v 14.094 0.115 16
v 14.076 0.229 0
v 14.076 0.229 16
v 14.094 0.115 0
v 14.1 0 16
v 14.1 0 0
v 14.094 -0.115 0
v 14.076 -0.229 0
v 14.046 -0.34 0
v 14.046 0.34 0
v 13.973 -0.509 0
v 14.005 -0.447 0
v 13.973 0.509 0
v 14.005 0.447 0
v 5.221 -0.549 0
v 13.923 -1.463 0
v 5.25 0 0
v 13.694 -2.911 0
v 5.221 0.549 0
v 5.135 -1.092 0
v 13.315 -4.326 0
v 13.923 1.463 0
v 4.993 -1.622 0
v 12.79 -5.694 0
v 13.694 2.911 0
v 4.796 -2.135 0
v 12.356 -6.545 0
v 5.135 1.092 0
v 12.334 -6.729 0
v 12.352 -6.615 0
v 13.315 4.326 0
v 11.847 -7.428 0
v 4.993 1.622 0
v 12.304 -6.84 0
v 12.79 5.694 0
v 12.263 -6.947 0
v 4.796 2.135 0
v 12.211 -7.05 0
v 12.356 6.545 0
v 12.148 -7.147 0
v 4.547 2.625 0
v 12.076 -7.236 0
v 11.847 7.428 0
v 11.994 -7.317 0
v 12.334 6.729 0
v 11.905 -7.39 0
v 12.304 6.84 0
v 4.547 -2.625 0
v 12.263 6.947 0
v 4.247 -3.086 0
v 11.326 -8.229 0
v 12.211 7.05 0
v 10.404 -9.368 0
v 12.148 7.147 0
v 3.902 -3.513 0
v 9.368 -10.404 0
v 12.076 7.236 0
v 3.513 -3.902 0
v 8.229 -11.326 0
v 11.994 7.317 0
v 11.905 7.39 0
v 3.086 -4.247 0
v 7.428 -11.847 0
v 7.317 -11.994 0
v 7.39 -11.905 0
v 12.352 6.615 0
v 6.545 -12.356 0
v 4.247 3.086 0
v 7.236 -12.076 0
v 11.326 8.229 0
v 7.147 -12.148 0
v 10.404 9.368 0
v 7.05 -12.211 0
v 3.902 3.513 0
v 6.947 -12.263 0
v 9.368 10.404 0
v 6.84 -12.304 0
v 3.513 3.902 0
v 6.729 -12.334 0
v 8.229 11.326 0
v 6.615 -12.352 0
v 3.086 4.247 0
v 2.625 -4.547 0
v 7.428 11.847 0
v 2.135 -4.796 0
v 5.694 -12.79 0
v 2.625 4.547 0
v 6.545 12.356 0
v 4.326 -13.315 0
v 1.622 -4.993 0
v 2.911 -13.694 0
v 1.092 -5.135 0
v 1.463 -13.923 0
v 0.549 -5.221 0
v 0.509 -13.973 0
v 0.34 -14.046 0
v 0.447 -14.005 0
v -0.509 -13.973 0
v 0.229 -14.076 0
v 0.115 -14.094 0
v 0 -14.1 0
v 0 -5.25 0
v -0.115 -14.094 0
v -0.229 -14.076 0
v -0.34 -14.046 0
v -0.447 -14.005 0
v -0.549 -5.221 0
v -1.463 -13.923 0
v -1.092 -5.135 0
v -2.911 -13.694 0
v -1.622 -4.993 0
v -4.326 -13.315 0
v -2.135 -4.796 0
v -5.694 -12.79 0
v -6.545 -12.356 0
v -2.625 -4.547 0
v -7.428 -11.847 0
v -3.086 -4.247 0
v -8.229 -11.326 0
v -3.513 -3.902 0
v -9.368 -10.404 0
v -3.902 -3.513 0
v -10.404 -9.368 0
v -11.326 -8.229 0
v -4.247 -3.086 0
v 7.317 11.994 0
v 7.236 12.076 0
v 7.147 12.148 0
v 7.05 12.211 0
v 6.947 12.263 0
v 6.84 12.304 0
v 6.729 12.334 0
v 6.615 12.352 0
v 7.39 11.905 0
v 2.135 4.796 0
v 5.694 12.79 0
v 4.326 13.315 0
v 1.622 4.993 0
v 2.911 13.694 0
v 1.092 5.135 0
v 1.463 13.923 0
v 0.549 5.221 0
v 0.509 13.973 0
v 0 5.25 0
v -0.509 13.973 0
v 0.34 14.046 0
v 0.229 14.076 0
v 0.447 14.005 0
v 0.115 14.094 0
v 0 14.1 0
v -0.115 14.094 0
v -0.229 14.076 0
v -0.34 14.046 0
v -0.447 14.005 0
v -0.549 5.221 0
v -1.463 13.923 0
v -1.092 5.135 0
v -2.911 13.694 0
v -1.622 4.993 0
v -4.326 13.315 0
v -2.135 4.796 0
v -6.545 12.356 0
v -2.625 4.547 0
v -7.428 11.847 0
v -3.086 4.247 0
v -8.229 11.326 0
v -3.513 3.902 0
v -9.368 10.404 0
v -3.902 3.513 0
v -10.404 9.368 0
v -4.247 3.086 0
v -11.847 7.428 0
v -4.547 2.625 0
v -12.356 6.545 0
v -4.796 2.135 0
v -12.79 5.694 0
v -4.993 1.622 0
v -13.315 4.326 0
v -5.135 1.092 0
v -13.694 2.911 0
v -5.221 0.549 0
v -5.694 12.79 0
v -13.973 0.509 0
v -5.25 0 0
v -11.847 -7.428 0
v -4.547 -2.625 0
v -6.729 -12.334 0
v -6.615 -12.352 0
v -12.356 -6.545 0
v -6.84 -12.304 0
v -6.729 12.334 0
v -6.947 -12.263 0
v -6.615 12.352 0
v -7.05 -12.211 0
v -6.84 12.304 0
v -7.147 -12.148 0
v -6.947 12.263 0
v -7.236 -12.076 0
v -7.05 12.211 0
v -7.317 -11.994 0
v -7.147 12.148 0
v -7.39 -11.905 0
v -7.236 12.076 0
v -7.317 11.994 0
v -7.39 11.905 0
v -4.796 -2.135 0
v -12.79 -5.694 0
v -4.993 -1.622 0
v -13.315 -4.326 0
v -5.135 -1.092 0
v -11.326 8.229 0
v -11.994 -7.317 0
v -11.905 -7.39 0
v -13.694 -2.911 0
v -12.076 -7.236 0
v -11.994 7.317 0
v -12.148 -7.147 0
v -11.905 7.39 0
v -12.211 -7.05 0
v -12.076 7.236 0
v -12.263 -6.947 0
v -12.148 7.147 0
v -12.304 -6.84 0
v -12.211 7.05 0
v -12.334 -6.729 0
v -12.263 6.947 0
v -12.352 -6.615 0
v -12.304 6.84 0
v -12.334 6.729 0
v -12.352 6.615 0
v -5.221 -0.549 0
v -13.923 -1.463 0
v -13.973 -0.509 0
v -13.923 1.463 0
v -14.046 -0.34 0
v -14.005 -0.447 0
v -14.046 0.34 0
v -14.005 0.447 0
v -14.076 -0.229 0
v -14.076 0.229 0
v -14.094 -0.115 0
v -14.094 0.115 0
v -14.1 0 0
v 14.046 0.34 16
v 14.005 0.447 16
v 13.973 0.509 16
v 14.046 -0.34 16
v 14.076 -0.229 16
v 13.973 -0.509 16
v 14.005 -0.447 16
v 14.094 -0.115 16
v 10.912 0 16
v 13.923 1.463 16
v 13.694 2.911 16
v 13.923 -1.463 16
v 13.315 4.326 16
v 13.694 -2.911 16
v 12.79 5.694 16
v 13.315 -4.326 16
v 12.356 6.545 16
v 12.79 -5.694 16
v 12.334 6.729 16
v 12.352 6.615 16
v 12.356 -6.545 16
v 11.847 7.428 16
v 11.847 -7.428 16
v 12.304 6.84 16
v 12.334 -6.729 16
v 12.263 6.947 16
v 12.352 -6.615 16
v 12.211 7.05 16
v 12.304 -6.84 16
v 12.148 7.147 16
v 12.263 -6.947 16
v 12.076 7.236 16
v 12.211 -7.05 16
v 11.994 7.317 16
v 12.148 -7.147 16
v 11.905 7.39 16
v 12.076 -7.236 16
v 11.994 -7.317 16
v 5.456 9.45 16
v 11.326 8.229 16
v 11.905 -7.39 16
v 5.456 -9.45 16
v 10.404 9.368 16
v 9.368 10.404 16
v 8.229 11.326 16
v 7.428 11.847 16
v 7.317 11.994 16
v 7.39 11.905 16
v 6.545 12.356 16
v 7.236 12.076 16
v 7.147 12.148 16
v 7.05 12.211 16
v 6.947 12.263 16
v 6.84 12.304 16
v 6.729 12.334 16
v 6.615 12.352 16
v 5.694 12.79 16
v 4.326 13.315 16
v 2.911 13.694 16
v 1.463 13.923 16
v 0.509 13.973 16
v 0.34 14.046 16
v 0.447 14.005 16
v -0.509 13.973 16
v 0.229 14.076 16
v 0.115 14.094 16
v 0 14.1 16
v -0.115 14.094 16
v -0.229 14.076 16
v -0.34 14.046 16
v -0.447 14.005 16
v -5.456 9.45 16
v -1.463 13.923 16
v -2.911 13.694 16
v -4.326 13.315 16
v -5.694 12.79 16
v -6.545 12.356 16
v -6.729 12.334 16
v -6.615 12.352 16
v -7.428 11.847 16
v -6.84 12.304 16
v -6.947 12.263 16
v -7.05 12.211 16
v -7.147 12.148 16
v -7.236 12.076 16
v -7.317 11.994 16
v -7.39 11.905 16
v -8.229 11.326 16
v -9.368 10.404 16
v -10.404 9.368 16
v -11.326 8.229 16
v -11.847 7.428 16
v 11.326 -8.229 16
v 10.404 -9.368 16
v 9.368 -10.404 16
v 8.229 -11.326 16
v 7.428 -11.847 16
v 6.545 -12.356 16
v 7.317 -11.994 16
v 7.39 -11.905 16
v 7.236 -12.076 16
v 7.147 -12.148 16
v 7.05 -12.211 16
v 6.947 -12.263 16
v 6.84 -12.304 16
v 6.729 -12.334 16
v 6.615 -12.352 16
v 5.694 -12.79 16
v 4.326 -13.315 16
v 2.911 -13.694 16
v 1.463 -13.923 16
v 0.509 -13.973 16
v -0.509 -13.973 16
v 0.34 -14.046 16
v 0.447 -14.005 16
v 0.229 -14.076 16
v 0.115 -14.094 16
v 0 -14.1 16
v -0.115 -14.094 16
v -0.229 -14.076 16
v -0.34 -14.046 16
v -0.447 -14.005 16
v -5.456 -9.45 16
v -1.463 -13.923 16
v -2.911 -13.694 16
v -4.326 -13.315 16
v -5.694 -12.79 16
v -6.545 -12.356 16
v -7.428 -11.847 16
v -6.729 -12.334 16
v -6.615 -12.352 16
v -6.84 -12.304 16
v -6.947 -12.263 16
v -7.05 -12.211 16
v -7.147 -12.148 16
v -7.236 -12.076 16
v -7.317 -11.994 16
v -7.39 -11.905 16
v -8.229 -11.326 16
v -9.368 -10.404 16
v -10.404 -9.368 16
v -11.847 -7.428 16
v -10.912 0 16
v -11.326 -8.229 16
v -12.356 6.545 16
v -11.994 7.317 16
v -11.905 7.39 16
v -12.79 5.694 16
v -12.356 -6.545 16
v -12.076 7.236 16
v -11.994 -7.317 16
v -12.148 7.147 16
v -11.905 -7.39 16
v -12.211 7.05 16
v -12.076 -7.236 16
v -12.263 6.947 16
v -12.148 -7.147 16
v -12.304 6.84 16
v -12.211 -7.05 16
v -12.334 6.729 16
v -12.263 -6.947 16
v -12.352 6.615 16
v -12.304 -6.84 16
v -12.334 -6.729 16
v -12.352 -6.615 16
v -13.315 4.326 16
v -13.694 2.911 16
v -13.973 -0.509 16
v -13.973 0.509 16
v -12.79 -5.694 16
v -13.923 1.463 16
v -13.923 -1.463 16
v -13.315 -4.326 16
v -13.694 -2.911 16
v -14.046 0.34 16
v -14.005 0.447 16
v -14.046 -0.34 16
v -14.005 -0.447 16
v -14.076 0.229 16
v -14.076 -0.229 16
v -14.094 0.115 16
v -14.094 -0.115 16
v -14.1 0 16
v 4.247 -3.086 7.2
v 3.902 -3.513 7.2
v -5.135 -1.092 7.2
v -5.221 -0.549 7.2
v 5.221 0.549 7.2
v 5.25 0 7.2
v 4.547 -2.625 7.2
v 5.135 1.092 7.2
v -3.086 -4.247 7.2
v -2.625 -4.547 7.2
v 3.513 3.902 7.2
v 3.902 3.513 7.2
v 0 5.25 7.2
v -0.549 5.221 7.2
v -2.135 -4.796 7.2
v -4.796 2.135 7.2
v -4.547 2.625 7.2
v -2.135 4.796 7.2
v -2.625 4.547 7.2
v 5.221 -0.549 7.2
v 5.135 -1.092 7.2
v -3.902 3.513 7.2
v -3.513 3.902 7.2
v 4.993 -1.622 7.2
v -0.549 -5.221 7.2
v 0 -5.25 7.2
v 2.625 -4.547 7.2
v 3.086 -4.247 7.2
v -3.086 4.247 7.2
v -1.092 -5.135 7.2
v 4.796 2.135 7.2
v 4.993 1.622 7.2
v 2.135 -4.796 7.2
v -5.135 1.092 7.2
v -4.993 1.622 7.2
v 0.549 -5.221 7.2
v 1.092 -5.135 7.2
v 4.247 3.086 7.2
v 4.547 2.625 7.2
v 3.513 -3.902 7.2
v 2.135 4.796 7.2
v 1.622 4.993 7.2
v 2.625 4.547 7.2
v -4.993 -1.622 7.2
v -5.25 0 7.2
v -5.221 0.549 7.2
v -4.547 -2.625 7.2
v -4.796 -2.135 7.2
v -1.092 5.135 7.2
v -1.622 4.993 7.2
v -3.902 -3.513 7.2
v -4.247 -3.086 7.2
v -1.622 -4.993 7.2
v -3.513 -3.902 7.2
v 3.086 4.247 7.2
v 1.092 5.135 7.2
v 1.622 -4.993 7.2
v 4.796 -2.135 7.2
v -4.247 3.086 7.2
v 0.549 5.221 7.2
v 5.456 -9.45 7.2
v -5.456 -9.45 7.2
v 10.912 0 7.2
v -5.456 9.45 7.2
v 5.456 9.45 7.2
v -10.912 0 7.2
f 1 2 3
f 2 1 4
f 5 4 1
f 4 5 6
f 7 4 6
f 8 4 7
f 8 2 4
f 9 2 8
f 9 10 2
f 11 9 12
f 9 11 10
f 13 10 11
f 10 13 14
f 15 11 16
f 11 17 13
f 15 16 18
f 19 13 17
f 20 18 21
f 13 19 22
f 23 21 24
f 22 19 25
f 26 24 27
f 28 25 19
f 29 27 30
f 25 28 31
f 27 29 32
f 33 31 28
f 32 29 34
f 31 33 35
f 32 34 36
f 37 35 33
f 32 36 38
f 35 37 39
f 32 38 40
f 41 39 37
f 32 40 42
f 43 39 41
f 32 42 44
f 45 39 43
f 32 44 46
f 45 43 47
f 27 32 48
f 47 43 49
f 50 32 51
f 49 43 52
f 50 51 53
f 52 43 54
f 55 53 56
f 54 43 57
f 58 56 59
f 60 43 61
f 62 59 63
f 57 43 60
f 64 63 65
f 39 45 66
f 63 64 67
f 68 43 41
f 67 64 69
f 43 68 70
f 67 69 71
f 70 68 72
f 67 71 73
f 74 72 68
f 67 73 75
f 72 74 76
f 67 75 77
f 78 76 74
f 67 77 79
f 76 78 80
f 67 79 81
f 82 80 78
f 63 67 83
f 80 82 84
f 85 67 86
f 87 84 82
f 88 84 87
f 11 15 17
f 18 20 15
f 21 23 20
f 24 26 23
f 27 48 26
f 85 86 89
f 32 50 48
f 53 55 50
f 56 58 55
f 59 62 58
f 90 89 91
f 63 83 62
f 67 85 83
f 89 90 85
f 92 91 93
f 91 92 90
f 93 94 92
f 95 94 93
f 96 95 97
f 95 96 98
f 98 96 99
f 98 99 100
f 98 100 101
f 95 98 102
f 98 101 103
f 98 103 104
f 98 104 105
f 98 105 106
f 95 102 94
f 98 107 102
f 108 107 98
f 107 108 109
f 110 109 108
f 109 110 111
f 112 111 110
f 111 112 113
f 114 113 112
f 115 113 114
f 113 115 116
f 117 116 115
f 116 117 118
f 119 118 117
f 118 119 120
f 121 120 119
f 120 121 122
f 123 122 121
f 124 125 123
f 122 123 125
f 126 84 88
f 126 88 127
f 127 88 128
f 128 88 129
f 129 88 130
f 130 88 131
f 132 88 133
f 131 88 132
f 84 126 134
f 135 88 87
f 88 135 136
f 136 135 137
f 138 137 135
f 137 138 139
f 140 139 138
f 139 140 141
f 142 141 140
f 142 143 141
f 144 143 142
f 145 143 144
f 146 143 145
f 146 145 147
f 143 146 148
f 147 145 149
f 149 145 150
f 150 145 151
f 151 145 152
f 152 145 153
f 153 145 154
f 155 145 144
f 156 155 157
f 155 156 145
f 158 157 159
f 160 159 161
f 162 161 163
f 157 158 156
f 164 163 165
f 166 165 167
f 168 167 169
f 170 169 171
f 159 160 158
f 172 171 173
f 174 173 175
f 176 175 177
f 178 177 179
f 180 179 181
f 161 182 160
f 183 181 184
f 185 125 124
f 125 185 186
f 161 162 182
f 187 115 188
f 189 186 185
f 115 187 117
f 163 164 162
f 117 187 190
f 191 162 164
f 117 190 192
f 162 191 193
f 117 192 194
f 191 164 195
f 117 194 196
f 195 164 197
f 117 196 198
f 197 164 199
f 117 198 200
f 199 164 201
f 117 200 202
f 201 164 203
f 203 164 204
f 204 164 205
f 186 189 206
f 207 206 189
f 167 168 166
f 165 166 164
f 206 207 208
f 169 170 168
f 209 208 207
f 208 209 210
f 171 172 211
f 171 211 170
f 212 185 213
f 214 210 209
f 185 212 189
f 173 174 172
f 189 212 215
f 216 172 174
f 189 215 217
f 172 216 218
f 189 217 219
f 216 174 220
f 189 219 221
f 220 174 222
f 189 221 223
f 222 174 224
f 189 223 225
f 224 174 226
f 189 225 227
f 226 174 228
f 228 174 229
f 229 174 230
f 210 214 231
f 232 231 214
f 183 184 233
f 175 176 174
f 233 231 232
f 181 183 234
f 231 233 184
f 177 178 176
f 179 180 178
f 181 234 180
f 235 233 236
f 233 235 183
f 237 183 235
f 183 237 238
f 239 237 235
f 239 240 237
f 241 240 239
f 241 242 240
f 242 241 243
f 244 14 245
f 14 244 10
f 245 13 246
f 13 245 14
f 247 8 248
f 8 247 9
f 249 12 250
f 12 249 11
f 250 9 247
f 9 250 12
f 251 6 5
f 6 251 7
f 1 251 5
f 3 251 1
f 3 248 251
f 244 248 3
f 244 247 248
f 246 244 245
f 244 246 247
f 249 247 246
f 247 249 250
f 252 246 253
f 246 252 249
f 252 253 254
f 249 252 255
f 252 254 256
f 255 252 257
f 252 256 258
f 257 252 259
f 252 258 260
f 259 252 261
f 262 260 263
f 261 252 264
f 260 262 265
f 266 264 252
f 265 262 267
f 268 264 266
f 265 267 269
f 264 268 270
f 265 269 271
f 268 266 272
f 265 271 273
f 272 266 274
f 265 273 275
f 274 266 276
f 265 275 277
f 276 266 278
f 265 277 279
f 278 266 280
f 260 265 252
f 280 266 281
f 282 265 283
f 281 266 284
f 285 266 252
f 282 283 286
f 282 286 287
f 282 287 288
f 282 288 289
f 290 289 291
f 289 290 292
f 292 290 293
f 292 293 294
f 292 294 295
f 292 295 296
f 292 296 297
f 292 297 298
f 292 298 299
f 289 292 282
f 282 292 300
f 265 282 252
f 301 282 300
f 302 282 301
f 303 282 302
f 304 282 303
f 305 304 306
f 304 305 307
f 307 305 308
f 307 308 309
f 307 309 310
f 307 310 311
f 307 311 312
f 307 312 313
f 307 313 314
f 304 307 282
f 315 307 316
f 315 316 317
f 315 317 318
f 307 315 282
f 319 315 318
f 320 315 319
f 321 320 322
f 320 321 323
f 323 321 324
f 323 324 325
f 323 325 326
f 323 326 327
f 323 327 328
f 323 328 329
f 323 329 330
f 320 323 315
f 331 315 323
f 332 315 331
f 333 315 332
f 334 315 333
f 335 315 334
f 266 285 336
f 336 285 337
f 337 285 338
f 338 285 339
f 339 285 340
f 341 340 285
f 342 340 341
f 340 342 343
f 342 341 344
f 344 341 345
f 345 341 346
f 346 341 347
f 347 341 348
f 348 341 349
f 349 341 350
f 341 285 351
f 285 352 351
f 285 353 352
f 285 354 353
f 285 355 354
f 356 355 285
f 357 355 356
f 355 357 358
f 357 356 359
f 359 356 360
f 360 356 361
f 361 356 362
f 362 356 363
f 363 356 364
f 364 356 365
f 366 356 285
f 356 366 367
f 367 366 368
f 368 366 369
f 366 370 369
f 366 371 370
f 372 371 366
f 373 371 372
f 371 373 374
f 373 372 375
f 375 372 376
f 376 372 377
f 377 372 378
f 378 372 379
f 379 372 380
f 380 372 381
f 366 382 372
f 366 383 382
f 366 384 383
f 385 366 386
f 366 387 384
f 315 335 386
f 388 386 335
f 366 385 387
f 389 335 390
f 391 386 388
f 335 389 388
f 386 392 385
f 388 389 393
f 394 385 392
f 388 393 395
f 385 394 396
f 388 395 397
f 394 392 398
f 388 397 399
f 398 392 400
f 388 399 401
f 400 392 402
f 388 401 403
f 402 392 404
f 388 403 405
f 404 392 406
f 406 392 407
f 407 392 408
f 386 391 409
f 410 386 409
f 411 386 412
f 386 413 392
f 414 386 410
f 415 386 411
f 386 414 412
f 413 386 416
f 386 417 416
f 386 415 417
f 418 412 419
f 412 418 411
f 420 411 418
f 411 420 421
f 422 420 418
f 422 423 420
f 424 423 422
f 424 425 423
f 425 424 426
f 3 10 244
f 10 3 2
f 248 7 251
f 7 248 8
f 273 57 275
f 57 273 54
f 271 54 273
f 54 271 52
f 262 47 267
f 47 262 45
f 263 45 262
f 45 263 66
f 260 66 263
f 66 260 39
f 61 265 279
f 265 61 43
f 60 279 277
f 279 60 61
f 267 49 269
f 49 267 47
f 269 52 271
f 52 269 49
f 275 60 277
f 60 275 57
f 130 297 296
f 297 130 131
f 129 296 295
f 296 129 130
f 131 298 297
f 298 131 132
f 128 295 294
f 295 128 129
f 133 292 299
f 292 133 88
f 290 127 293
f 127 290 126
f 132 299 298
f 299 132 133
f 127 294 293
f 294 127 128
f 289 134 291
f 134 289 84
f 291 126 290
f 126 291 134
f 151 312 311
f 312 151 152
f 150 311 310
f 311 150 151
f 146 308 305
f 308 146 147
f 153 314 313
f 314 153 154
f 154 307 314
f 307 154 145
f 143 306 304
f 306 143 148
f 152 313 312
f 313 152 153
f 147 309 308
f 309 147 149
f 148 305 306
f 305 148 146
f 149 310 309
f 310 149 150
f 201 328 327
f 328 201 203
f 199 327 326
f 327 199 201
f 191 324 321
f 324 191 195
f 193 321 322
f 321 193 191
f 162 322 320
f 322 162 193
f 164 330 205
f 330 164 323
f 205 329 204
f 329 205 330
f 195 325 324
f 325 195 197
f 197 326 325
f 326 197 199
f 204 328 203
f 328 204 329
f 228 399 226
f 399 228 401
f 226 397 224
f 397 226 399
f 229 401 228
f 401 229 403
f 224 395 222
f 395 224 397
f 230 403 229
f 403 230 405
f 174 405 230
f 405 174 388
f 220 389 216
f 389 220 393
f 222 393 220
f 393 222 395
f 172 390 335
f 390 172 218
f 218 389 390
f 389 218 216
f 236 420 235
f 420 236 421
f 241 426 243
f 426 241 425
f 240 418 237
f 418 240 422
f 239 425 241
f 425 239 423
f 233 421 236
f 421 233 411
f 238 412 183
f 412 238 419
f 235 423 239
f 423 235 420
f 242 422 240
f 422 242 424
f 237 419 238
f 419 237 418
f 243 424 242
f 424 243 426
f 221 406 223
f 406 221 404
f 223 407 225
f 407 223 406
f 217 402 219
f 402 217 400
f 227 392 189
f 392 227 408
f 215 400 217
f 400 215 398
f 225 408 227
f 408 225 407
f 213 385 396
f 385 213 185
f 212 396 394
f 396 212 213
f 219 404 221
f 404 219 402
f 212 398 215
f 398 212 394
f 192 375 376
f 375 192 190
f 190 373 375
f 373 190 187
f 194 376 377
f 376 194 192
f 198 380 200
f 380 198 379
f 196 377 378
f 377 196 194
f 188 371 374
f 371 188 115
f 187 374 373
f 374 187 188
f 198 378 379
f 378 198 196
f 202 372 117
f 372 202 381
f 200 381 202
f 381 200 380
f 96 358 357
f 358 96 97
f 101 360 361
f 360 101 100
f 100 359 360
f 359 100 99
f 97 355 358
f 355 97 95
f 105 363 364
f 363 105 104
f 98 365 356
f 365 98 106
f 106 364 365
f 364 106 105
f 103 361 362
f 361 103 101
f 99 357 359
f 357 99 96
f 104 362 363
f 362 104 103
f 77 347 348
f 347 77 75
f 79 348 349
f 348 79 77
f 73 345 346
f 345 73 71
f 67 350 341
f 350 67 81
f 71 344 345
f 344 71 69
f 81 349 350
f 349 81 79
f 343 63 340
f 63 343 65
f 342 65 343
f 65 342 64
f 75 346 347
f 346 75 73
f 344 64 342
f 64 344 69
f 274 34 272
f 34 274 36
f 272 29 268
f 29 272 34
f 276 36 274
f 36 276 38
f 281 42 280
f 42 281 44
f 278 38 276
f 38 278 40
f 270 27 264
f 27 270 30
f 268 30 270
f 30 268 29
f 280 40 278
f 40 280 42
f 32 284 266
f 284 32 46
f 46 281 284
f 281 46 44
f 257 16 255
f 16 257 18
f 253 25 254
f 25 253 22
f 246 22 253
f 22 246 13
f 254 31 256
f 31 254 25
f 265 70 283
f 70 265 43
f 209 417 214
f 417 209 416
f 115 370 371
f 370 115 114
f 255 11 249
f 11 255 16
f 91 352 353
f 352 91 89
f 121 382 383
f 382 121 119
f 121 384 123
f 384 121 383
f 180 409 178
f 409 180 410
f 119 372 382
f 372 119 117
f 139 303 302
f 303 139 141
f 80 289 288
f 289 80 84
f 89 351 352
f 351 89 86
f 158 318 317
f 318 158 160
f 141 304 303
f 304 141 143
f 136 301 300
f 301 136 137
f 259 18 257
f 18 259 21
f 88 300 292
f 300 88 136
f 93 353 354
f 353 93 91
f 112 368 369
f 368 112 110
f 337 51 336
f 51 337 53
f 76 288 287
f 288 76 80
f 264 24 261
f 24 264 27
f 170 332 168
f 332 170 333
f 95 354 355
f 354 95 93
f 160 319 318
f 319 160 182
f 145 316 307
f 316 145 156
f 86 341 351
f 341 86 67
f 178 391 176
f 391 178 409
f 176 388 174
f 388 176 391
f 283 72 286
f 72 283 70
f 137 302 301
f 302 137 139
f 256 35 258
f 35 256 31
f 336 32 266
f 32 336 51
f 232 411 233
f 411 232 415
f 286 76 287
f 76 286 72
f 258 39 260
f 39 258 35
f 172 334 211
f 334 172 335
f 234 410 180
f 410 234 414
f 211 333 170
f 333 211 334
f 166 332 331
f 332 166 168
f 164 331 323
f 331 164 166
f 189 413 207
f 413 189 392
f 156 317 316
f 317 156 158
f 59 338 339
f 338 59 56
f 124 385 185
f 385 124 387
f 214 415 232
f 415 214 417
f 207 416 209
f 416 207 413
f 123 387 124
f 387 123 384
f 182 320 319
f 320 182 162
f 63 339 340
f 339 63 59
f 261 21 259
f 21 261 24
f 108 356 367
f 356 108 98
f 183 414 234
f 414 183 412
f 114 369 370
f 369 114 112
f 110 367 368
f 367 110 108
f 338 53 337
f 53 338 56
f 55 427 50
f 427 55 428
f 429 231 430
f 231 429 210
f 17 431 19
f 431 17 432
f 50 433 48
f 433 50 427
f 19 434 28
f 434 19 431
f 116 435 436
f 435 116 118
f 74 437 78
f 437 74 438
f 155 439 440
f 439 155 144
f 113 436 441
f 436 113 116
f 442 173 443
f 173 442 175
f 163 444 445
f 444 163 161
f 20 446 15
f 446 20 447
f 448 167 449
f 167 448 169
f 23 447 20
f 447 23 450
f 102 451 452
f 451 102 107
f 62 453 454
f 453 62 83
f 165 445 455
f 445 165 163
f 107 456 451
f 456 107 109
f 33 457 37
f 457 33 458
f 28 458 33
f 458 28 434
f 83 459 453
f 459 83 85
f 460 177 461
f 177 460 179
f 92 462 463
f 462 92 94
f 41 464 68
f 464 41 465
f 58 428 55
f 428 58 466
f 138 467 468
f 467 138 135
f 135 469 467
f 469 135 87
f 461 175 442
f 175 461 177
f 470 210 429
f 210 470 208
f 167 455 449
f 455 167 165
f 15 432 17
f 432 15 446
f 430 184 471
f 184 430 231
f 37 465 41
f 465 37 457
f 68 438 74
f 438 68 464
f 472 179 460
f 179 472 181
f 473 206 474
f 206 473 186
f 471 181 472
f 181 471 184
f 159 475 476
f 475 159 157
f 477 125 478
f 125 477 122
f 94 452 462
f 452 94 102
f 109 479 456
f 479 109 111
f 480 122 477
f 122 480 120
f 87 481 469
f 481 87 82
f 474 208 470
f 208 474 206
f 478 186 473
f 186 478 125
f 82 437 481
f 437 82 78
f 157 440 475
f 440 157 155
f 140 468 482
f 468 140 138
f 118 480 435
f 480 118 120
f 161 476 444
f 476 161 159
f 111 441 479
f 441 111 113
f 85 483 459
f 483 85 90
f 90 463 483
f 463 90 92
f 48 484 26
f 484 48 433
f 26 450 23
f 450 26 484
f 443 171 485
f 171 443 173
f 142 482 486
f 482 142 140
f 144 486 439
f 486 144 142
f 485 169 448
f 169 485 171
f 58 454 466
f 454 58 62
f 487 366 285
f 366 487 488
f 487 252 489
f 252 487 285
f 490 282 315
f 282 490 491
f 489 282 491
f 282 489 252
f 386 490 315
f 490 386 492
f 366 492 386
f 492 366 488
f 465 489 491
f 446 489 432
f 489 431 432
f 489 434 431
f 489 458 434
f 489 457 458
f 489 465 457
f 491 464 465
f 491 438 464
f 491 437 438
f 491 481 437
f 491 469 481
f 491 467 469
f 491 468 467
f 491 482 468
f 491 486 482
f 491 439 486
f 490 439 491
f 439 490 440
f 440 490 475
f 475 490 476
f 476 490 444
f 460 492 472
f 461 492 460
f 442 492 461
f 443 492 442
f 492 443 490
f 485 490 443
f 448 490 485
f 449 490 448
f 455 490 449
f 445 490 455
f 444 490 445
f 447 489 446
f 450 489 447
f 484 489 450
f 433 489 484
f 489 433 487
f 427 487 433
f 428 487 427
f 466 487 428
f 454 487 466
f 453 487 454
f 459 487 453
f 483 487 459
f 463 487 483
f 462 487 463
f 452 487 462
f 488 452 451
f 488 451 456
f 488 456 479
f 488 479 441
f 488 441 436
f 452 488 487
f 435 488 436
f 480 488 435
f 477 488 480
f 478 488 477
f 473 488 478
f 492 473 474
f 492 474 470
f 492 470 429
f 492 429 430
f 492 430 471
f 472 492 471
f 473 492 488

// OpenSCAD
// Knurled-style thumb knob with hex socket.
$fn = 60;
eps = 0.02;
thread_d = 10.5;
knob_d = 28;
knob_h = 16;
socket_flat = thread_d * 1.8;
difference() {
    union() {
        cylinder(d = knob_d, h = knob_h);
        for (i = [0 : 11]) rotate([0, 0, i * 30]) translate([knob_d / 2 - 1, 0, 0]) cylinder(d = 2.2, h = knob_h);
    }
    translate([0, 0, -eps]) cylinder(d = thread_d, h = knob_h + 2 * eps);
    translate([0, 0, knob_h - knob_h * 0.55]) cylinder(d = socket_flat / cos(30), h = knob_h * 0.55 + eps, $fn = 6);
}
